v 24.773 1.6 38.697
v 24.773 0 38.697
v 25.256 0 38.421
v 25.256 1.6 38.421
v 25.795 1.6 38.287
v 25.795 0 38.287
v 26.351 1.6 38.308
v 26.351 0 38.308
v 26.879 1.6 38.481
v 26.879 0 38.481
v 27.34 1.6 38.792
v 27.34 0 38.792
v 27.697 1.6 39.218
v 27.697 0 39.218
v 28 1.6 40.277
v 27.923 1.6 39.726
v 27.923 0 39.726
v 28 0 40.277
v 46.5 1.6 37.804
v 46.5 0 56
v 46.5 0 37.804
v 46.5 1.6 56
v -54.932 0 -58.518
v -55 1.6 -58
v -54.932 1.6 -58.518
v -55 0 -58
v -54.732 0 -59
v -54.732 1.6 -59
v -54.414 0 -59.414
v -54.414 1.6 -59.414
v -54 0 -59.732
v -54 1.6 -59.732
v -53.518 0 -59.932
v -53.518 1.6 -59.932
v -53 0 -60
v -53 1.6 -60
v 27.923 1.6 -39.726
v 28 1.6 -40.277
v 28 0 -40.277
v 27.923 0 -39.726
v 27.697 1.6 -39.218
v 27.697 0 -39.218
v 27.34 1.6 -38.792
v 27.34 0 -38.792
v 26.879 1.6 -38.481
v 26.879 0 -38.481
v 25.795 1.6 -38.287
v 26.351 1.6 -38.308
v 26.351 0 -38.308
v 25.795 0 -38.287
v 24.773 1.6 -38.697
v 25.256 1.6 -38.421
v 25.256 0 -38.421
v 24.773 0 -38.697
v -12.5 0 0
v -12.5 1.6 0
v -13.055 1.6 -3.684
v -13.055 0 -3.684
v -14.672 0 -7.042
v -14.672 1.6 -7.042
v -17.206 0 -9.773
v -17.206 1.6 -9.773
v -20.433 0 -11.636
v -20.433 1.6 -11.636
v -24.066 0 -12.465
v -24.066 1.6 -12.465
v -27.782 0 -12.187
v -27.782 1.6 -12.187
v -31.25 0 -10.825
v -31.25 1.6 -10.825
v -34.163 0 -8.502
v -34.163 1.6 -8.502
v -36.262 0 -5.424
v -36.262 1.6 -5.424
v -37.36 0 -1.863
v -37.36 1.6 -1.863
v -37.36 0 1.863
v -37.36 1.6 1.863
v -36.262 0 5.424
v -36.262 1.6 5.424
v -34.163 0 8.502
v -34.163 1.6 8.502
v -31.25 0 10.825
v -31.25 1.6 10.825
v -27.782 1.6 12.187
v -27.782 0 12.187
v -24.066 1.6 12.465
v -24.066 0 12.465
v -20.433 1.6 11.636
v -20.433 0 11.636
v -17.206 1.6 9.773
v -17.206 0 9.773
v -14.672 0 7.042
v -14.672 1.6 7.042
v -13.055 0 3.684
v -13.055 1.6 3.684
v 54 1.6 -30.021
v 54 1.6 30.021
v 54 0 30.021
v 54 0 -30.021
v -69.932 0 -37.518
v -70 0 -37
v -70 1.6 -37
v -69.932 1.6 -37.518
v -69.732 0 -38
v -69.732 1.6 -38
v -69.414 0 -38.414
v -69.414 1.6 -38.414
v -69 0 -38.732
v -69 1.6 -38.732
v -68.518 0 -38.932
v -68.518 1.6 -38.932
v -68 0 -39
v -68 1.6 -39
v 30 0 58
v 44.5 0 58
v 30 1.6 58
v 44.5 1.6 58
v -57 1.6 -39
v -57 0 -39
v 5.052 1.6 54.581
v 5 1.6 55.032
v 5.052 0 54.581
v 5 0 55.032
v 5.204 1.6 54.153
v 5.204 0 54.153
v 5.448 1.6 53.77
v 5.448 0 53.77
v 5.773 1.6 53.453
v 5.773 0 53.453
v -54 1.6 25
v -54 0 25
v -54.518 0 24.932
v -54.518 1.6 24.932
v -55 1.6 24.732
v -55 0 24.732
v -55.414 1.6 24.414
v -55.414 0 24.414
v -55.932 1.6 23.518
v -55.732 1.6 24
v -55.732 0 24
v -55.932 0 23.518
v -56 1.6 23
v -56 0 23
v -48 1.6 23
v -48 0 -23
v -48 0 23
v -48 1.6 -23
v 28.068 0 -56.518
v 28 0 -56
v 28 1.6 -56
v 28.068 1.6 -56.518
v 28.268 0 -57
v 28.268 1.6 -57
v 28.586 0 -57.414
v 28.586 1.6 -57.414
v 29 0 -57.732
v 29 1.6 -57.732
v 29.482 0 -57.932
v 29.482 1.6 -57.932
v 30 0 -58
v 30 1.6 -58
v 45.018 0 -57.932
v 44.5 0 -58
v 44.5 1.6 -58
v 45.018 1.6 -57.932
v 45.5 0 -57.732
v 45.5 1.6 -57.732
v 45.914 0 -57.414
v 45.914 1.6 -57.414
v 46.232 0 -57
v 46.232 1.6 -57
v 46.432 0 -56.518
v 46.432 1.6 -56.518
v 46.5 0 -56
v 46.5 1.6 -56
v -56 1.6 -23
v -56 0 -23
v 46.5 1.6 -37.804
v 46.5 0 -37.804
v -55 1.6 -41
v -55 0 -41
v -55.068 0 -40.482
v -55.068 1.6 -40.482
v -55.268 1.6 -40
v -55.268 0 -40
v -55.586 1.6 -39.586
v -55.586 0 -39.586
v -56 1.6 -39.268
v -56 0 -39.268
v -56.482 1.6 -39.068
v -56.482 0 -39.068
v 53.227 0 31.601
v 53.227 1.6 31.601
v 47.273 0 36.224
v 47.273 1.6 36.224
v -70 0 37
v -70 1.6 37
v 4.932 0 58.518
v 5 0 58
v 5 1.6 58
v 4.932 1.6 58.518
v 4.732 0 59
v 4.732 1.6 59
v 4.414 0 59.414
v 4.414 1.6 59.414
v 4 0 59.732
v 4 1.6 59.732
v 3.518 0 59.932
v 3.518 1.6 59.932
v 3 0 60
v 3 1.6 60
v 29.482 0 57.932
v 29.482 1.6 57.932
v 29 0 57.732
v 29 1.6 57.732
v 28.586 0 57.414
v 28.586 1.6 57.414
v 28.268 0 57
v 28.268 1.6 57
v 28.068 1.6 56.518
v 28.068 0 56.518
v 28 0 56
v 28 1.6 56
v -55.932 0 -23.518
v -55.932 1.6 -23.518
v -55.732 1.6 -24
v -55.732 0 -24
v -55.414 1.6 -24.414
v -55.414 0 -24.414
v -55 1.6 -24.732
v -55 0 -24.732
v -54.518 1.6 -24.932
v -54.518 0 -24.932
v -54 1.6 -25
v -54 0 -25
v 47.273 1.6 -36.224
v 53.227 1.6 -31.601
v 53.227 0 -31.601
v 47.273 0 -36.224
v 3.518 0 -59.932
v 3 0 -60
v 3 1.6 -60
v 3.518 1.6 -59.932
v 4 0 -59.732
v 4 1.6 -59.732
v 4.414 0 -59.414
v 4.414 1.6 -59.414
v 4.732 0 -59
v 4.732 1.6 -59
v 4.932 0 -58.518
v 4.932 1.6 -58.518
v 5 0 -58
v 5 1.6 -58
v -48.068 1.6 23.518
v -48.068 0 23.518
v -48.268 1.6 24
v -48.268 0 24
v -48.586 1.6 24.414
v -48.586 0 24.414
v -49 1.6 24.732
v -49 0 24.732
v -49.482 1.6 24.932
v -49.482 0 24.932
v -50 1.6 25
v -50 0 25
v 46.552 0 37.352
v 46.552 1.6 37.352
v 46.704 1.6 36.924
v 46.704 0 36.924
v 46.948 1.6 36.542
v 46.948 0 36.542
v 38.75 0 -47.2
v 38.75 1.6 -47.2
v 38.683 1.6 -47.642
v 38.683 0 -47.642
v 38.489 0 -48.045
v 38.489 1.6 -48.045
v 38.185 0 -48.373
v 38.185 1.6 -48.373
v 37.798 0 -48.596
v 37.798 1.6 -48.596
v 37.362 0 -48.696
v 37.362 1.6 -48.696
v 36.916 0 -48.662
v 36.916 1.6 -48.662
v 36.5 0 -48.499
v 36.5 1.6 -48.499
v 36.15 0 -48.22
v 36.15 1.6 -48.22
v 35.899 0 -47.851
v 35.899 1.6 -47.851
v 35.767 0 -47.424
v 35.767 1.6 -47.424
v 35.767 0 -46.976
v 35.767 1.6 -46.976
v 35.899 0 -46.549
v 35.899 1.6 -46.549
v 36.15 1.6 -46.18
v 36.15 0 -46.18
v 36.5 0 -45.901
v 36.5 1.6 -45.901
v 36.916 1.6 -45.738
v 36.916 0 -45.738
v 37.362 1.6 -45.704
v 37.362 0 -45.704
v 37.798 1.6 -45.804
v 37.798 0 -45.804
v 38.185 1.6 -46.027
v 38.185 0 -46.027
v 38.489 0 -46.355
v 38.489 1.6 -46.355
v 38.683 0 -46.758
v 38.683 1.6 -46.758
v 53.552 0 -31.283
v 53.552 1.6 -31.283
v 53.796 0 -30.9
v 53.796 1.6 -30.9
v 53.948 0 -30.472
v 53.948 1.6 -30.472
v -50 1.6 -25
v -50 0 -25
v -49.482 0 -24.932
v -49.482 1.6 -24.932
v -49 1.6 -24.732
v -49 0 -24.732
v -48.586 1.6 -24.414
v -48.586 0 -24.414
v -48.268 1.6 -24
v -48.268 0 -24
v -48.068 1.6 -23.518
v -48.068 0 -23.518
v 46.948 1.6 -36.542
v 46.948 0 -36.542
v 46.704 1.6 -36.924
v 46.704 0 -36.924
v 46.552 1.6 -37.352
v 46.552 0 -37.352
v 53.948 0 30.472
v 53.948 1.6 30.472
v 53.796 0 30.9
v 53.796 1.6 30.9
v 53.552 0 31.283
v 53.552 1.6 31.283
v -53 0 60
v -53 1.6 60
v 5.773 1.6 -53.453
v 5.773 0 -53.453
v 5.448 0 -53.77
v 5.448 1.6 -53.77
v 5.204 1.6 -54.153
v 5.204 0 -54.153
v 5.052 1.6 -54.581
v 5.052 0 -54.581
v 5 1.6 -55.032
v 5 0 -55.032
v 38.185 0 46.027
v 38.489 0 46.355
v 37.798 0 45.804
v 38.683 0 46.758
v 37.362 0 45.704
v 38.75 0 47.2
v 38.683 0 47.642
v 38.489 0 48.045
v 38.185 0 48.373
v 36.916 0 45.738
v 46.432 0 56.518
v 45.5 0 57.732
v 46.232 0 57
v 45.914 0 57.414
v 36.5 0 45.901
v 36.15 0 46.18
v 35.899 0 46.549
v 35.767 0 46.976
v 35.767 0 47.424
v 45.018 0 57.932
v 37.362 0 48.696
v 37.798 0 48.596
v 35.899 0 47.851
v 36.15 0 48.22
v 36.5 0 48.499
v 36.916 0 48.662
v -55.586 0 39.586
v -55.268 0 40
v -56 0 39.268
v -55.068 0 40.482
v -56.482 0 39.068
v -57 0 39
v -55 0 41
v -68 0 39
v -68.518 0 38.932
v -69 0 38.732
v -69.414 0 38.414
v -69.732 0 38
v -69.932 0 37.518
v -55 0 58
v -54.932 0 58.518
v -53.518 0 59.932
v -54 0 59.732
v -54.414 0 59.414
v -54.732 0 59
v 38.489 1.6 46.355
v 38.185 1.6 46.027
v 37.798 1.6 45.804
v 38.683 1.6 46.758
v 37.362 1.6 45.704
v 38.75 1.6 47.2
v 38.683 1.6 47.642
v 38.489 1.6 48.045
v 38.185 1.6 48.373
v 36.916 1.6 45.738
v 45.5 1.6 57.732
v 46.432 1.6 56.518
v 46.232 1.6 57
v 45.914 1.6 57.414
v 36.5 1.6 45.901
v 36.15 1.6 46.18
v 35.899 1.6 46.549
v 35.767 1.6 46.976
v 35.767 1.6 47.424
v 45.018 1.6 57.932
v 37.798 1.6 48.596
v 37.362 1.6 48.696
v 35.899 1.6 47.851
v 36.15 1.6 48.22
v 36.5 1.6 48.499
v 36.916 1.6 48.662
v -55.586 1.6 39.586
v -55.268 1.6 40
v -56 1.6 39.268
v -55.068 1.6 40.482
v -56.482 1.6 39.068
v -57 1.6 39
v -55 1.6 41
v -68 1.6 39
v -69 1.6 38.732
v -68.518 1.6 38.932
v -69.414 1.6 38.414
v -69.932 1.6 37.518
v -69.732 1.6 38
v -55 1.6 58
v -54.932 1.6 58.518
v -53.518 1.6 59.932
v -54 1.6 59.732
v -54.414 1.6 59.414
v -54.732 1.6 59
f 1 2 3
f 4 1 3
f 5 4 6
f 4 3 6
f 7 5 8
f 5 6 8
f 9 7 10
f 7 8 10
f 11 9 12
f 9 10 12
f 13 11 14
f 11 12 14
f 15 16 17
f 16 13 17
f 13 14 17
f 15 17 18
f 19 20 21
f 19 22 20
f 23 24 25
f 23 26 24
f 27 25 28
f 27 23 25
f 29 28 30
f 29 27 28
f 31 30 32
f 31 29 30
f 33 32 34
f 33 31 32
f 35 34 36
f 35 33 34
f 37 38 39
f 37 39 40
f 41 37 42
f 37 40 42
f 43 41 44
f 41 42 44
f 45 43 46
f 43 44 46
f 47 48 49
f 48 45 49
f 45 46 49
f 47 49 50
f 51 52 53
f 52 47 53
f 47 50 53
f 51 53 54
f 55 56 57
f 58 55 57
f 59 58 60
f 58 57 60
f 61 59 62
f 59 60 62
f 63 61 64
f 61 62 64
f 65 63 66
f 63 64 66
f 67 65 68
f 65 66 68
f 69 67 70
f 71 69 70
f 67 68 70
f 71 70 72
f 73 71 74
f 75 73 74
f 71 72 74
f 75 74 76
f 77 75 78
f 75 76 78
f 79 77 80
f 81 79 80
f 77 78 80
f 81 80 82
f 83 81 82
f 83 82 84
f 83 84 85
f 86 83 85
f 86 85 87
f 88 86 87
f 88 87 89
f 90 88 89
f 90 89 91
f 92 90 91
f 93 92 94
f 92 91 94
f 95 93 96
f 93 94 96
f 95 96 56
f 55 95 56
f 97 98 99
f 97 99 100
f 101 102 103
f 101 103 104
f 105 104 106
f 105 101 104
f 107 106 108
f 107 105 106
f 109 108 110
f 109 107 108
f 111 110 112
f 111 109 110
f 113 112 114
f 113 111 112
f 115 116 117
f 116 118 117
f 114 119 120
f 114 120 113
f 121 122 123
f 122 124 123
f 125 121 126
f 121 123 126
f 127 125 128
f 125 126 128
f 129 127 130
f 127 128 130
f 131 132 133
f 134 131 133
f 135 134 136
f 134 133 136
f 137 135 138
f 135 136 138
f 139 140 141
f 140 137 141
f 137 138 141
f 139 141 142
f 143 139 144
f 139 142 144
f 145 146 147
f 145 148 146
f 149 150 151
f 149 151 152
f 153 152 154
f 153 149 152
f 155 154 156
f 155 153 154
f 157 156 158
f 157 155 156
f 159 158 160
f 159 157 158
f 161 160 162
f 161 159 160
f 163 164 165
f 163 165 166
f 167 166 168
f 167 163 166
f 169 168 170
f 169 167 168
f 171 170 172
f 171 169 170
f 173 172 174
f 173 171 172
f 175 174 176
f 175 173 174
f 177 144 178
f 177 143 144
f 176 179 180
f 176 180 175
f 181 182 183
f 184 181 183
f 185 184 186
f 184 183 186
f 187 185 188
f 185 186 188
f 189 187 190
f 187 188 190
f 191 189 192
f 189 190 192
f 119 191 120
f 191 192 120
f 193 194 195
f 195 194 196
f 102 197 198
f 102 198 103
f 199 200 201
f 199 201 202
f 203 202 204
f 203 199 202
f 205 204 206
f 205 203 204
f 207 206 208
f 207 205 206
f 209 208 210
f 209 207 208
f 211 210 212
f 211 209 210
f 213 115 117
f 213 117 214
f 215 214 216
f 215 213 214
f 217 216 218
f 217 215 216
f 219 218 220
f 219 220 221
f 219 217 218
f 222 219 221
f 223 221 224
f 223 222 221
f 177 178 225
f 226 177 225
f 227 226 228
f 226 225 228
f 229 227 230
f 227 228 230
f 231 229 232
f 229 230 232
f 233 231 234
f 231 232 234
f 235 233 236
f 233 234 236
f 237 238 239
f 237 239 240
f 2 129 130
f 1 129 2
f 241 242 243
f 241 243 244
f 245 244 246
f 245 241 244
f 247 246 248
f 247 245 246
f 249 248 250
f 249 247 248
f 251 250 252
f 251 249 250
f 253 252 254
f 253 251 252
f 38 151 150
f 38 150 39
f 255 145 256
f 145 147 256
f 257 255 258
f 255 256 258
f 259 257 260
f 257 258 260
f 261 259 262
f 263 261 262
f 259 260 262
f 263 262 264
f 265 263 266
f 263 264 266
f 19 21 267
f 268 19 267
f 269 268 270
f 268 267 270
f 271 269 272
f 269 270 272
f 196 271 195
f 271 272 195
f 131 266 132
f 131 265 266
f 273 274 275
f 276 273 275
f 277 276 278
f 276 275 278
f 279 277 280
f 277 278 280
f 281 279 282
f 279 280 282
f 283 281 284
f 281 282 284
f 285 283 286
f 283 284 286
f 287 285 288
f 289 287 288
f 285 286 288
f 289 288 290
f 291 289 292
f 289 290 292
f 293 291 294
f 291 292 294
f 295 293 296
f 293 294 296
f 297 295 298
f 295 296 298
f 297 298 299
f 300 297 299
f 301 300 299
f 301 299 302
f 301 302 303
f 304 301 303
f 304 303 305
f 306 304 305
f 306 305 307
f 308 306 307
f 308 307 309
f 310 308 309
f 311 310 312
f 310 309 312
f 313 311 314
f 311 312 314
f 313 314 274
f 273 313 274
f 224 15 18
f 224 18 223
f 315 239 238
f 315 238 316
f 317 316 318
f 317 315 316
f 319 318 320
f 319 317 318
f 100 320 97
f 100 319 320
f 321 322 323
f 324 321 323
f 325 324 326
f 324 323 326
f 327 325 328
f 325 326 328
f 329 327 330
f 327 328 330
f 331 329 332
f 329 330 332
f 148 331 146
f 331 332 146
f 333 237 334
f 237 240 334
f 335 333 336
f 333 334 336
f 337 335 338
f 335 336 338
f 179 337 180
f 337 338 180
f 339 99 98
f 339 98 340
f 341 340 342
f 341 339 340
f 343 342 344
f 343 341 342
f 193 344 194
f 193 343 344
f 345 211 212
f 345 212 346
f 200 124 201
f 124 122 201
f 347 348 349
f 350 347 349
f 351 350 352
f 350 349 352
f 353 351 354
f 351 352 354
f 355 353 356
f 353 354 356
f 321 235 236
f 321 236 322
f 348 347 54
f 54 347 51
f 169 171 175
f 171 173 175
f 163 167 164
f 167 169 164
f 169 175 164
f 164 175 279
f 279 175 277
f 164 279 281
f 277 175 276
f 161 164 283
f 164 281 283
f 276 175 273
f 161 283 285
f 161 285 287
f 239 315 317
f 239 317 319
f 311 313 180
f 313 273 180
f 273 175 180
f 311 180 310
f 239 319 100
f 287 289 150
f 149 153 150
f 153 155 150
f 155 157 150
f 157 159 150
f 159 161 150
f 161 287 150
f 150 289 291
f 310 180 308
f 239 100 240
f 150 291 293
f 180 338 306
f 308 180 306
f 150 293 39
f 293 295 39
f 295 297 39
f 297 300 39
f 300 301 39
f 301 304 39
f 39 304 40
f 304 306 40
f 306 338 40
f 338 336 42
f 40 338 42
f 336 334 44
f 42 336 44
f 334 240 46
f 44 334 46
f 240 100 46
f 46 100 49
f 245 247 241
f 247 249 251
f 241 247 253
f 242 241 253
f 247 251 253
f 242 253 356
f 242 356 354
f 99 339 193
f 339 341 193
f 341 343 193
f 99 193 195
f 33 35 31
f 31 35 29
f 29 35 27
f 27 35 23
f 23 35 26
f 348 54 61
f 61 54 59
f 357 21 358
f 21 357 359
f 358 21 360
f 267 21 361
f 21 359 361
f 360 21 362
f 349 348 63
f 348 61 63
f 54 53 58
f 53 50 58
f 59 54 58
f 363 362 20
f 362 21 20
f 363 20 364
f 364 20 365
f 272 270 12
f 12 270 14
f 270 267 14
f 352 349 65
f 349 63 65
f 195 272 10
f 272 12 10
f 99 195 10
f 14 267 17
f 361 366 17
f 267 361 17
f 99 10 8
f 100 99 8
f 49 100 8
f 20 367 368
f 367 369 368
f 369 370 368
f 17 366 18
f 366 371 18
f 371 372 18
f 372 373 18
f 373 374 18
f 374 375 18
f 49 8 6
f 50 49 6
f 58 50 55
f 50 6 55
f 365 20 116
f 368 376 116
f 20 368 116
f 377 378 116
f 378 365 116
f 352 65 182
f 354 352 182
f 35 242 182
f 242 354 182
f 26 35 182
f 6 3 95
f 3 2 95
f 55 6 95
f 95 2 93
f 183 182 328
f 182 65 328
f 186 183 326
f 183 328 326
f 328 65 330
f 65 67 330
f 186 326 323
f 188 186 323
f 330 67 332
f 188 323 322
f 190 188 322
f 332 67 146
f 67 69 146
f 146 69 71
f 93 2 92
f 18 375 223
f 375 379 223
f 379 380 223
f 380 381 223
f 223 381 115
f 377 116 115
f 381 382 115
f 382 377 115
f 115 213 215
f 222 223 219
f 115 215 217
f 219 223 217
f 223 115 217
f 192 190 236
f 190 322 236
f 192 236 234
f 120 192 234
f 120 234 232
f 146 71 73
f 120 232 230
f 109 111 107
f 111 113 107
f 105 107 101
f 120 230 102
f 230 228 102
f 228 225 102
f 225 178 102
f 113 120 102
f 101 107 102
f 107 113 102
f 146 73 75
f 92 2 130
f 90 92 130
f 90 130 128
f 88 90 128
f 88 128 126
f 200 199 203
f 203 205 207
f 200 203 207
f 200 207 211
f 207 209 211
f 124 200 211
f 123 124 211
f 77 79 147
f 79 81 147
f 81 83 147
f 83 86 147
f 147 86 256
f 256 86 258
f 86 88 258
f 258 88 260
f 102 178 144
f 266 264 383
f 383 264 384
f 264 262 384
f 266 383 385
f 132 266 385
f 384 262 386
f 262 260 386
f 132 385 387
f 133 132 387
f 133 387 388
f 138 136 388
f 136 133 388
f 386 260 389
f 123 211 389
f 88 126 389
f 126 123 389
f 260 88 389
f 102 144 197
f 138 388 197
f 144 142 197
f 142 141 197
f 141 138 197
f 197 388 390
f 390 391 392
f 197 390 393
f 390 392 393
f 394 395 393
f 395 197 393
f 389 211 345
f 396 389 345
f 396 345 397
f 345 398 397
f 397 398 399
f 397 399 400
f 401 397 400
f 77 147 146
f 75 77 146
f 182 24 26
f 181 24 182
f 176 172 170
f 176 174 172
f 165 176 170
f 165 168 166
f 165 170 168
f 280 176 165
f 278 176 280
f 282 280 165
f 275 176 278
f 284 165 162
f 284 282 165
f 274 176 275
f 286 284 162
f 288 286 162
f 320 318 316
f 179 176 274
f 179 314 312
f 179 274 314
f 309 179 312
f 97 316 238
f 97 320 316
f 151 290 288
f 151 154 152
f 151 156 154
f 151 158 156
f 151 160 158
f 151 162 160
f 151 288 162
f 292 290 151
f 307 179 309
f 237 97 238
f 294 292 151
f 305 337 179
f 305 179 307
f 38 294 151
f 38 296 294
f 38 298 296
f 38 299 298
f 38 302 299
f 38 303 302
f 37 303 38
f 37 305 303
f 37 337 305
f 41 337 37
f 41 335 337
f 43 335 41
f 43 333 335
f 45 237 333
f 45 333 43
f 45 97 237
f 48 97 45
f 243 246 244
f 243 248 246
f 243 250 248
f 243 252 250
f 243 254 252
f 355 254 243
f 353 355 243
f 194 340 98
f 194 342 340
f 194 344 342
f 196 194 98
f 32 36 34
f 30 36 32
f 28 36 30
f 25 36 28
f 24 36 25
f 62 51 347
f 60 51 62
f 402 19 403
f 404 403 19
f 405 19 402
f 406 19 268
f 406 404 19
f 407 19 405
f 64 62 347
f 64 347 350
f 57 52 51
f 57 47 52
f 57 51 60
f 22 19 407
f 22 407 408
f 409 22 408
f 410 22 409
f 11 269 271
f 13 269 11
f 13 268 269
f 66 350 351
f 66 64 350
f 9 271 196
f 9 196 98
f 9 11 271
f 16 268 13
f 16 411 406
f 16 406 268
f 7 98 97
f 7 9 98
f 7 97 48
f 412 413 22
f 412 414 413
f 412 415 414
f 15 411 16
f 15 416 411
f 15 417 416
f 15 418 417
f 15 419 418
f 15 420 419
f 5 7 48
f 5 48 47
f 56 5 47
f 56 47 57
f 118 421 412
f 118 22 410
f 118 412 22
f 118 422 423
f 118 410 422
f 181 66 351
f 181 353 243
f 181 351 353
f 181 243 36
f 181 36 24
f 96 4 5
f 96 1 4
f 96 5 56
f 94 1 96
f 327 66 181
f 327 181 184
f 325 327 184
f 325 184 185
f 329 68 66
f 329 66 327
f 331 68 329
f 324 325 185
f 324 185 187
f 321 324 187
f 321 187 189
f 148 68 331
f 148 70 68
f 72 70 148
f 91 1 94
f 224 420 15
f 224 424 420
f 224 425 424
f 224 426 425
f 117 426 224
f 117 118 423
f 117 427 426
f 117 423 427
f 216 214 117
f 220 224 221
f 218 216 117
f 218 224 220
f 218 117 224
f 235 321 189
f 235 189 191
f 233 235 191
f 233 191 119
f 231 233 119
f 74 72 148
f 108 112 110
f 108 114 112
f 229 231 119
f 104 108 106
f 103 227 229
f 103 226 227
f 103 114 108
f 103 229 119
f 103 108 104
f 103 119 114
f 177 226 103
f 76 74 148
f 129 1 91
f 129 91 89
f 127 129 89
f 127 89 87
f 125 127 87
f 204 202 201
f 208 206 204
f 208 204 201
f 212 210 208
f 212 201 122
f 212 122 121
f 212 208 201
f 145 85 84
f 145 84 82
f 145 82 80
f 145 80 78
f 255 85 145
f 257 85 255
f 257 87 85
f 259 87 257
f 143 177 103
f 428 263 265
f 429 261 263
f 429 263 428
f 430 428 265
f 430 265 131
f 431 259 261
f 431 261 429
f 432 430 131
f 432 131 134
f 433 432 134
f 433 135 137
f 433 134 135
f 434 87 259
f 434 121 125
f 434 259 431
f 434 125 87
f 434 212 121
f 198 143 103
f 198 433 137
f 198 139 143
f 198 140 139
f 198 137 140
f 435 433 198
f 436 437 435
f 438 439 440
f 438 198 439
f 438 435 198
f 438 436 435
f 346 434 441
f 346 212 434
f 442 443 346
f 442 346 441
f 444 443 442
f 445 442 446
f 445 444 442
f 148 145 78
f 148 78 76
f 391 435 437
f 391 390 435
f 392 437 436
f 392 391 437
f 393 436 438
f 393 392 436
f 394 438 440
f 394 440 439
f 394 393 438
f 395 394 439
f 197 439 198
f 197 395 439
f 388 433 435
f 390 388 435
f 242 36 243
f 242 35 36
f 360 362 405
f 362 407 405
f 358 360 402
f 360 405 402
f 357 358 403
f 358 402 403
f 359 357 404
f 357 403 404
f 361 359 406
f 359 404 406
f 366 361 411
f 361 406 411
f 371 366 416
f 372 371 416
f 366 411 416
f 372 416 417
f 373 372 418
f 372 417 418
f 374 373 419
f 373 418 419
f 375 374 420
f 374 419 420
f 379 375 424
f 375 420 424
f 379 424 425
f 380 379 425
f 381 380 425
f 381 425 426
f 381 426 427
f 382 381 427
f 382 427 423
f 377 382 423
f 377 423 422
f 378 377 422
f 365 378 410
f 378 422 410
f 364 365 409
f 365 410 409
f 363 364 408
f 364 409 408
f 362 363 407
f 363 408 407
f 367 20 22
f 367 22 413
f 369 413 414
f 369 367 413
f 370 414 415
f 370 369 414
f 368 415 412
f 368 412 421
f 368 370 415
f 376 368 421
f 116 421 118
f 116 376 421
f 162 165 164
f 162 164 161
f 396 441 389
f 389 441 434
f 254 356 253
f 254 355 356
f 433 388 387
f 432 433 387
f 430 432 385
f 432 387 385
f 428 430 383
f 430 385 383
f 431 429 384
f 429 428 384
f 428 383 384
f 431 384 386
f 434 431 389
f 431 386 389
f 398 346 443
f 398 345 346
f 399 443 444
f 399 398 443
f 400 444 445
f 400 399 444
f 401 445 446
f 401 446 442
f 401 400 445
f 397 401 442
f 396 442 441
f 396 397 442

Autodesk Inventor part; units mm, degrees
ref_plane "YZ Plane" through (0, 0, 0) normal (1, 0, 0) x (0, 1, 0)
ref_plane "XZ Plane" through (0, 0, 0) normal (0, 1, 0) x (-1, 0, 0)
ref_plane "XY Plane" through (0, 0, 0) normal (0, 0, 1) x (1, 0, 0)
sketch "Esboço1" plane through (0, 0, 0) normal (0, 1, 0) x (-1, 0, 0)
  line L0 (-70, 60) -> (70, 60)
  line L1 (70, 60) -> (70, -60)
  line L2 (70, -60) -> (-70, -60)
  line L3 (-70, -60) -> (-70, 60)
  line L4 (-70, 60) -> (70, -60) construction
  line L5 (70, 60) -> (-70, -60) construction
  point P0 (0, 0)
  dimension "d0" = 140
  dimension "d1" = 120
extrude "Extrusão1" add sketch "Esboço1" along normal blind 1.6
sketch "Esboço2" plane through (0, 1.6, 0) normal (0, 1, 0) x (1, 0, 0)
  line L0 (-94.6357, 0) -> (83.6022, 0)
  line L1 (-70, -37) -> (-52, -37)
  line L2 (-52, 37) -> (-70, 37)
  line L3 (-70, 37) -> (-70, -37)
  line L4 (-70, -37) -> (-52, 37) construction
  line L5 (-52, -37) -> (-70, 37) construction
  line L6 (-70, 60) -> (-70, -60) projected
  line L7 (-70, 0) -> (-70, 0)
  line L8 (-70, 0) -> (-25, 0)
  circle A0 centre (-25, 0) radius 12.5
  line L9 (-70, -60) -> (70, -60) projected
  line L10 (-20, -60) -> (-50, -60)
  line L11 (-20, -60) -> (10, -60)
  line L12 (70, 60) -> (-70, 60) projected
  line L13 (-55, -60) -> (5, -60)
  line L14 (5, -60) -> (5, -45)
  line L15 (-55, -45) -> (-55, -60)
  line L16 (-52, 0) -> (-70, 0)
  line L17 (-56, 25) -> (-48, 25)
  line L18 (-48, 25) -> (-48, -25)
  line L19 (-48, -25) -> (-56, -25)
  line L20 (-56, -25) -> (-56, 25)
  line L21 (-56, 25) -> (-48, -25) construction
  line L22 (-48, 25) -> (-56, -25) construction
  line L23 (-55, 60) -> (5, 60)
  line L24 (5, 60) -> (5, 45)
  line L25 (-55, 45) -> (-55, 60)
  line L26 (-25, 76.0053) -> (-25, -77.5323)
  line L27 (-35, -45) -> (-35, -37)
  line L28 (-35, -37) -> (-15, -37)
  line L29 (-15, -37) -> (-15, -45)
  line L30 (5, -45) -> (-15, -45)
  line L31 (-35, -45) -> (-55, -45)
  line L32 (-35, 45) -> (-35, 37)
  line L33 (-35, 37) -> (-15, 37)
  line L34 (-15, 37) -> (-15, 45)
  line L35 (5, 45) -> (-15, 45)
  line L36 (-35, 45) -> (-55, 45)
  line L37 (-55, -60) -> (5, -45) construction
  line L38 (5, -60) -> (-55, -45) construction
  line L39 (-35, 45) -> (-15, 37) construction
  line L40 (-15, 45) -> (-35, 37) construction
  point P0 (0, 0)
  point P1 (-61, 0)
  point P2 (-25, 41)
  dimension "d4" = 18
  dimension "d5" = 74
  dimension "d6" = 0
  dimension "d7" = 45
  dimension "d8" = 25
  dimension "d28" = 15
  dimension "d30" = 18
  dimension "d31" = 8
  dimension "d32" = 50
  dimension "d35" = 15
  dimension "d36" = 20
  dimension "d38" = 8
  dimension "d40" = 20
  dimension "d41" = 8
  dimension "d42" = 60
  dimension "d43" = 60
extrude "Extrusão4" cut sketch "Esboço2" against normal through all contours L26 A0 L0 | L26 A0 L0 | L0 A0 L26 | L0 A0 L26 | L18 L19 L20 L0 | L0 L20 L17 L18
sketch "Esboço3" plane through (0, 1.6, 0) normal (0, 1, 0) x (1, 0, 0)
  line L0 (44.5, -40) -> (30, -40) construction
  line L1 (30, -40) -> (30, -72.5) construction
  line L2 (30, -72.5) -> (44.5, -72.5) construction
  line L3 (44.5, -72.5) -> (44.5, -40) construction
  line L4 (30, 40) -> (44.5, 40) construction
  line L5 (44.5, 40) -> (44.5, 72.5) construction
  line L6 (44.5, 72.5) -> (30, 72.5) construction
  line L7 (30, 72.5) -> (30, 40) construction
  line L8 (37.25, -40) -> (37.25, -47.2) construction
  circle A0 centre (37.25, -47.2) radius 1.5
  line L9 (37.25, 40) -> (37.25, 47.2) construction
  circle A1 centre (37.25, 47.2) radius 1.5
  line L10 (-70, 60) -> (-70, -60) projected
  line L11 (52, 14) -> (49.5, 14) construction
  line L12 (49.5, 14) -> (49.5, -14) construction
  line L13 (49.5, -14) -> (52, -14) construction
  line L14 (52, -14) -> (52, 14) construction
  line L15 (52, 14) -> (49.5, -14) construction
  line L16 (49.5, 14) -> (52, -14) construction
  line L17 (54, 16) -> (47.5, 16)
  line L18 (47.5, 16) -> (47.5, -16) construction
  line L19 (47.5, -16) -> (54, -16) construction
  line L20 (54, -16) -> (54, 16)
  line L21 (70, -60) -> (70, 60) projected
  line L22 (5, -54.0532) -> (28, -36.1915)
  line L23 (28, -36.1915) -> (28, -58)
  line L24 (44.5, -69.5) -> (44.5446, -69.5)
  line L25 (46.5, -58) -> (46.5, -38)
  line L26 (46.5, -38) -> (46.5, -36.8245)
  line L27 (46.5, -58) -> (28, -58)
  line L28 (-70, -60) -> (70, -60) projected
  line L29 (7, -60) -> (5, -60)
  line L30 (70, 60) -> (-70, 60) projected
  line L31 (70, 60) -> (7, 60)
  line L32 (5, 54.0532) -> (28, 36.1915)
  line L33 (28, 58) -> (28, 36.1915)
  line L34 (44.5446, 69.5) -> (44.5, 69.5)
  line L35 (46.5, 58) -> (28, 58)
  line L36 (46.5, 36.8245) -> (46.5, 58)
  line L37 (5, 54.0532) -> (5, 60)
  line L38 (5, -54.0532) -> (5, -60)
  line L39 (54, -16) -> (54, -31)
  line L40 (54, -31) -> (46.5, -36.8245)
  line L41 (54, 16) -> (54, 31)
  line L42 (54, 31) -> (46.5, 36.8245)
  point P0 (0, 0)
  dimension "d59" = 14.5
  dimension "d60" = 32.5
  dimension "d63" = 32.5
  dimension "d64" = 14.5
  dimension "d76" = 7.2
  dimension "d77" = 3
  dimension "d78" = 7.2
  dimension "d79" = 3
  dimension "d97" = 2.5
  dimension "d98" = 28
  dimension "d99" = 2
  dimension "d103" = 2
  dimension "d104" = 2
  dimension "d105" = 63
  dimension "d107" = 2
  dimension "d132" = 15
  dimension "d133" = 15
sketch "Esboço4" plane through (0, 1.6, 0) normal (0, 1, 0) x (1, 0, 0)
  line L0 (-70, 60) -> (-70, -60) projected
  line L1 (-70, 0) -> (-70, -100)
  line L2 (-70, -100) -> (180, -100)
  line L3 (180, -100) -> (180, 100)
  line L4 (180, 100) -> (-70, 100)
  line L5 (-70, 100) -> (-70, -100)
  line L6 (250, 0) -> (-150, 0)
  line L7 (-430, 10) -> (570, 10)
  line L8 (570, 10) -> (570, -10)
  line L9 (570, -10) -> (-430, -10)
  line L10 (-430, -10) -> (-430, 10)
  line L11 (70, -60) -> (70, 60) projected
  line L12 (-430, 10) -> (570, -10) construction
  line L13 (570, 10) -> (-430, -10) construction
  line L14 (27.5, -90) -> (47.5, -90)
  line L15 (47.5, -90) -> (47.5, -50)
  line L16 (47.5, -50) -> (27.5, -50)
  line L17 (27.5, -50) -> (27.5, -90)
  line L18 (27.5, -90) -> (47.5, -50) construction
  line L19 (47.5, -90) -> (27.5, -50) construction
  line L20 (70, 60) -> (-70, 60) projected
  line L21 (47.5, 90) -> (27.5, 90)
  line L22 (27.5, 90) -> (27.5, 50)
  line L23 (27.5, 50) -> (47.5, 50)
  line L24 (47.5, 50) -> (47.5, 90)
  line L25 (47.5, 90) -> (27.5, 50) construction
  line L26 (27.5, 90) -> (47.5, 50) construction
  line L27 (0, -100) -> (0, 100) construction
  point P0 (0, 0)
  point P1 (70, 0)
  point P2 (37.5, -70)
  point P3 (37.5, 70)
  dimension "d53" = 100
  dimension "d54" = 250
  dimension "d55" = 200
  dimension "d65" = 1000
  dimension "d66" = 20
  dimension "d68" = 20
  dimension "d69" = 40
  dimension "d70" = 20
  dimension "d71" = 40
  dimension "d72" = 40
  dimension "d73" = 40
  dimension "d80" = 37.5
  dimension "d81" = 37.5
extrude "Extrusão5" cut sketch "Esboço3" against normal through all contours A0 | A1
sketch "Esboço5" plane through (0, 1.6, 0) normal (0, 1, 0) x (1, 0, 0)
  line L0 (70, 60) -> (-70, 60) projected
  line L1 (-70, 60) -> (-55, 60)
  line L2 (-55, 60) -> (-55, 39)
  line L3 (-55, 39) -> (-70, 39)
  line L4 (-70, 39) -> (-70, 60)
  line L5 (-70, -60) -> (70, -60) projected
  line L6 (-70, -60) -> (-55, -60)
  line L7 (-55, -60) -> (-55, -39)
  line L8 (-55, -39) -> (-70, -39)
  line L9 (-70, -39) -> (-70, -60)
  line L10 (-70, 60) -> (-70, -60) projected
  line L11 (-55, 39) -> (-70, 39)
  line L12 (-70, 39) -> (-70, 60)
  line L13 (-70, 60) -> (-55, 60)
  line L14 (-55, 60) -> (-55, 39)
  line L15 (-55, -39) -> (-70, -39)
  line L16 (-70, -39) -> (-70, -60)
  line L17 (-70, -60) -> (-55, -60)
  line L18 (-55, -60) -> (-55, -39)
  point P0 (0, 0)
  dimension "d84" = 15
  dimension "d85" = 21
  dimension "d86" = 15
  dimension "d87" = 21
extrude "Extrusão6" cut sketch "Esboço5" against normal through all
fillet "Arredondamento1" radius 2 10 edges at (-70, 0.8, 39) (-55, 0.8, 39) (-55, 0.8, 60) (-56, 0.8, 25) (-48, 0.8, 25) (-56, 0.8, -25) (-48, 0.8, -25) (-70, 0.8, -39) (-55, 0.8, -39) (-55, 0.8, -60)
sketch "Esboço7" plane through (0, 1.6, 0) normal (0, 1, 0) x (1, 0, 0)
  line L0 (-3.4695, -17.196) -> (-3.4695, -2.1961) construction
  line L1 (-3.4695, -2.1961) -> (11.6526, -2.1961) construction
  line L2 (11.6526, -2.1961) -> (11.6526, -17.196) construction
  line L3 (11.6526, -17.196) -> (-3.4695, -17.196) construction
  point P0 (0, 0)
extrude "Extrusão10" cut sketch "Esboço3" against normal through all contours L30 L21 L28 L38 L22 L23 L27 L25 L26 L40 L39 L20 L41 L42 L36 L35 L33 L32 L37
fillet "Arredondamento4" radius 2 14 edges at (5, 0.8, 60) (5, 0.8, 54.0532) (28, 0.8, 36.1915) (28, 0.8, 58) (46.5, 0.8, 58) (46.5, 0.8, 36.8245) (54, 0.8, 31) (54, 0.8, -31) (46.5, 0.8, -36.8245) (46.5, 0.8, -58) (28, 0.8, -58) (28, 0.8, -36.1915) (5, 0.8, -54.0532) (5, 0.8, -60)
properties part number "PCB"
